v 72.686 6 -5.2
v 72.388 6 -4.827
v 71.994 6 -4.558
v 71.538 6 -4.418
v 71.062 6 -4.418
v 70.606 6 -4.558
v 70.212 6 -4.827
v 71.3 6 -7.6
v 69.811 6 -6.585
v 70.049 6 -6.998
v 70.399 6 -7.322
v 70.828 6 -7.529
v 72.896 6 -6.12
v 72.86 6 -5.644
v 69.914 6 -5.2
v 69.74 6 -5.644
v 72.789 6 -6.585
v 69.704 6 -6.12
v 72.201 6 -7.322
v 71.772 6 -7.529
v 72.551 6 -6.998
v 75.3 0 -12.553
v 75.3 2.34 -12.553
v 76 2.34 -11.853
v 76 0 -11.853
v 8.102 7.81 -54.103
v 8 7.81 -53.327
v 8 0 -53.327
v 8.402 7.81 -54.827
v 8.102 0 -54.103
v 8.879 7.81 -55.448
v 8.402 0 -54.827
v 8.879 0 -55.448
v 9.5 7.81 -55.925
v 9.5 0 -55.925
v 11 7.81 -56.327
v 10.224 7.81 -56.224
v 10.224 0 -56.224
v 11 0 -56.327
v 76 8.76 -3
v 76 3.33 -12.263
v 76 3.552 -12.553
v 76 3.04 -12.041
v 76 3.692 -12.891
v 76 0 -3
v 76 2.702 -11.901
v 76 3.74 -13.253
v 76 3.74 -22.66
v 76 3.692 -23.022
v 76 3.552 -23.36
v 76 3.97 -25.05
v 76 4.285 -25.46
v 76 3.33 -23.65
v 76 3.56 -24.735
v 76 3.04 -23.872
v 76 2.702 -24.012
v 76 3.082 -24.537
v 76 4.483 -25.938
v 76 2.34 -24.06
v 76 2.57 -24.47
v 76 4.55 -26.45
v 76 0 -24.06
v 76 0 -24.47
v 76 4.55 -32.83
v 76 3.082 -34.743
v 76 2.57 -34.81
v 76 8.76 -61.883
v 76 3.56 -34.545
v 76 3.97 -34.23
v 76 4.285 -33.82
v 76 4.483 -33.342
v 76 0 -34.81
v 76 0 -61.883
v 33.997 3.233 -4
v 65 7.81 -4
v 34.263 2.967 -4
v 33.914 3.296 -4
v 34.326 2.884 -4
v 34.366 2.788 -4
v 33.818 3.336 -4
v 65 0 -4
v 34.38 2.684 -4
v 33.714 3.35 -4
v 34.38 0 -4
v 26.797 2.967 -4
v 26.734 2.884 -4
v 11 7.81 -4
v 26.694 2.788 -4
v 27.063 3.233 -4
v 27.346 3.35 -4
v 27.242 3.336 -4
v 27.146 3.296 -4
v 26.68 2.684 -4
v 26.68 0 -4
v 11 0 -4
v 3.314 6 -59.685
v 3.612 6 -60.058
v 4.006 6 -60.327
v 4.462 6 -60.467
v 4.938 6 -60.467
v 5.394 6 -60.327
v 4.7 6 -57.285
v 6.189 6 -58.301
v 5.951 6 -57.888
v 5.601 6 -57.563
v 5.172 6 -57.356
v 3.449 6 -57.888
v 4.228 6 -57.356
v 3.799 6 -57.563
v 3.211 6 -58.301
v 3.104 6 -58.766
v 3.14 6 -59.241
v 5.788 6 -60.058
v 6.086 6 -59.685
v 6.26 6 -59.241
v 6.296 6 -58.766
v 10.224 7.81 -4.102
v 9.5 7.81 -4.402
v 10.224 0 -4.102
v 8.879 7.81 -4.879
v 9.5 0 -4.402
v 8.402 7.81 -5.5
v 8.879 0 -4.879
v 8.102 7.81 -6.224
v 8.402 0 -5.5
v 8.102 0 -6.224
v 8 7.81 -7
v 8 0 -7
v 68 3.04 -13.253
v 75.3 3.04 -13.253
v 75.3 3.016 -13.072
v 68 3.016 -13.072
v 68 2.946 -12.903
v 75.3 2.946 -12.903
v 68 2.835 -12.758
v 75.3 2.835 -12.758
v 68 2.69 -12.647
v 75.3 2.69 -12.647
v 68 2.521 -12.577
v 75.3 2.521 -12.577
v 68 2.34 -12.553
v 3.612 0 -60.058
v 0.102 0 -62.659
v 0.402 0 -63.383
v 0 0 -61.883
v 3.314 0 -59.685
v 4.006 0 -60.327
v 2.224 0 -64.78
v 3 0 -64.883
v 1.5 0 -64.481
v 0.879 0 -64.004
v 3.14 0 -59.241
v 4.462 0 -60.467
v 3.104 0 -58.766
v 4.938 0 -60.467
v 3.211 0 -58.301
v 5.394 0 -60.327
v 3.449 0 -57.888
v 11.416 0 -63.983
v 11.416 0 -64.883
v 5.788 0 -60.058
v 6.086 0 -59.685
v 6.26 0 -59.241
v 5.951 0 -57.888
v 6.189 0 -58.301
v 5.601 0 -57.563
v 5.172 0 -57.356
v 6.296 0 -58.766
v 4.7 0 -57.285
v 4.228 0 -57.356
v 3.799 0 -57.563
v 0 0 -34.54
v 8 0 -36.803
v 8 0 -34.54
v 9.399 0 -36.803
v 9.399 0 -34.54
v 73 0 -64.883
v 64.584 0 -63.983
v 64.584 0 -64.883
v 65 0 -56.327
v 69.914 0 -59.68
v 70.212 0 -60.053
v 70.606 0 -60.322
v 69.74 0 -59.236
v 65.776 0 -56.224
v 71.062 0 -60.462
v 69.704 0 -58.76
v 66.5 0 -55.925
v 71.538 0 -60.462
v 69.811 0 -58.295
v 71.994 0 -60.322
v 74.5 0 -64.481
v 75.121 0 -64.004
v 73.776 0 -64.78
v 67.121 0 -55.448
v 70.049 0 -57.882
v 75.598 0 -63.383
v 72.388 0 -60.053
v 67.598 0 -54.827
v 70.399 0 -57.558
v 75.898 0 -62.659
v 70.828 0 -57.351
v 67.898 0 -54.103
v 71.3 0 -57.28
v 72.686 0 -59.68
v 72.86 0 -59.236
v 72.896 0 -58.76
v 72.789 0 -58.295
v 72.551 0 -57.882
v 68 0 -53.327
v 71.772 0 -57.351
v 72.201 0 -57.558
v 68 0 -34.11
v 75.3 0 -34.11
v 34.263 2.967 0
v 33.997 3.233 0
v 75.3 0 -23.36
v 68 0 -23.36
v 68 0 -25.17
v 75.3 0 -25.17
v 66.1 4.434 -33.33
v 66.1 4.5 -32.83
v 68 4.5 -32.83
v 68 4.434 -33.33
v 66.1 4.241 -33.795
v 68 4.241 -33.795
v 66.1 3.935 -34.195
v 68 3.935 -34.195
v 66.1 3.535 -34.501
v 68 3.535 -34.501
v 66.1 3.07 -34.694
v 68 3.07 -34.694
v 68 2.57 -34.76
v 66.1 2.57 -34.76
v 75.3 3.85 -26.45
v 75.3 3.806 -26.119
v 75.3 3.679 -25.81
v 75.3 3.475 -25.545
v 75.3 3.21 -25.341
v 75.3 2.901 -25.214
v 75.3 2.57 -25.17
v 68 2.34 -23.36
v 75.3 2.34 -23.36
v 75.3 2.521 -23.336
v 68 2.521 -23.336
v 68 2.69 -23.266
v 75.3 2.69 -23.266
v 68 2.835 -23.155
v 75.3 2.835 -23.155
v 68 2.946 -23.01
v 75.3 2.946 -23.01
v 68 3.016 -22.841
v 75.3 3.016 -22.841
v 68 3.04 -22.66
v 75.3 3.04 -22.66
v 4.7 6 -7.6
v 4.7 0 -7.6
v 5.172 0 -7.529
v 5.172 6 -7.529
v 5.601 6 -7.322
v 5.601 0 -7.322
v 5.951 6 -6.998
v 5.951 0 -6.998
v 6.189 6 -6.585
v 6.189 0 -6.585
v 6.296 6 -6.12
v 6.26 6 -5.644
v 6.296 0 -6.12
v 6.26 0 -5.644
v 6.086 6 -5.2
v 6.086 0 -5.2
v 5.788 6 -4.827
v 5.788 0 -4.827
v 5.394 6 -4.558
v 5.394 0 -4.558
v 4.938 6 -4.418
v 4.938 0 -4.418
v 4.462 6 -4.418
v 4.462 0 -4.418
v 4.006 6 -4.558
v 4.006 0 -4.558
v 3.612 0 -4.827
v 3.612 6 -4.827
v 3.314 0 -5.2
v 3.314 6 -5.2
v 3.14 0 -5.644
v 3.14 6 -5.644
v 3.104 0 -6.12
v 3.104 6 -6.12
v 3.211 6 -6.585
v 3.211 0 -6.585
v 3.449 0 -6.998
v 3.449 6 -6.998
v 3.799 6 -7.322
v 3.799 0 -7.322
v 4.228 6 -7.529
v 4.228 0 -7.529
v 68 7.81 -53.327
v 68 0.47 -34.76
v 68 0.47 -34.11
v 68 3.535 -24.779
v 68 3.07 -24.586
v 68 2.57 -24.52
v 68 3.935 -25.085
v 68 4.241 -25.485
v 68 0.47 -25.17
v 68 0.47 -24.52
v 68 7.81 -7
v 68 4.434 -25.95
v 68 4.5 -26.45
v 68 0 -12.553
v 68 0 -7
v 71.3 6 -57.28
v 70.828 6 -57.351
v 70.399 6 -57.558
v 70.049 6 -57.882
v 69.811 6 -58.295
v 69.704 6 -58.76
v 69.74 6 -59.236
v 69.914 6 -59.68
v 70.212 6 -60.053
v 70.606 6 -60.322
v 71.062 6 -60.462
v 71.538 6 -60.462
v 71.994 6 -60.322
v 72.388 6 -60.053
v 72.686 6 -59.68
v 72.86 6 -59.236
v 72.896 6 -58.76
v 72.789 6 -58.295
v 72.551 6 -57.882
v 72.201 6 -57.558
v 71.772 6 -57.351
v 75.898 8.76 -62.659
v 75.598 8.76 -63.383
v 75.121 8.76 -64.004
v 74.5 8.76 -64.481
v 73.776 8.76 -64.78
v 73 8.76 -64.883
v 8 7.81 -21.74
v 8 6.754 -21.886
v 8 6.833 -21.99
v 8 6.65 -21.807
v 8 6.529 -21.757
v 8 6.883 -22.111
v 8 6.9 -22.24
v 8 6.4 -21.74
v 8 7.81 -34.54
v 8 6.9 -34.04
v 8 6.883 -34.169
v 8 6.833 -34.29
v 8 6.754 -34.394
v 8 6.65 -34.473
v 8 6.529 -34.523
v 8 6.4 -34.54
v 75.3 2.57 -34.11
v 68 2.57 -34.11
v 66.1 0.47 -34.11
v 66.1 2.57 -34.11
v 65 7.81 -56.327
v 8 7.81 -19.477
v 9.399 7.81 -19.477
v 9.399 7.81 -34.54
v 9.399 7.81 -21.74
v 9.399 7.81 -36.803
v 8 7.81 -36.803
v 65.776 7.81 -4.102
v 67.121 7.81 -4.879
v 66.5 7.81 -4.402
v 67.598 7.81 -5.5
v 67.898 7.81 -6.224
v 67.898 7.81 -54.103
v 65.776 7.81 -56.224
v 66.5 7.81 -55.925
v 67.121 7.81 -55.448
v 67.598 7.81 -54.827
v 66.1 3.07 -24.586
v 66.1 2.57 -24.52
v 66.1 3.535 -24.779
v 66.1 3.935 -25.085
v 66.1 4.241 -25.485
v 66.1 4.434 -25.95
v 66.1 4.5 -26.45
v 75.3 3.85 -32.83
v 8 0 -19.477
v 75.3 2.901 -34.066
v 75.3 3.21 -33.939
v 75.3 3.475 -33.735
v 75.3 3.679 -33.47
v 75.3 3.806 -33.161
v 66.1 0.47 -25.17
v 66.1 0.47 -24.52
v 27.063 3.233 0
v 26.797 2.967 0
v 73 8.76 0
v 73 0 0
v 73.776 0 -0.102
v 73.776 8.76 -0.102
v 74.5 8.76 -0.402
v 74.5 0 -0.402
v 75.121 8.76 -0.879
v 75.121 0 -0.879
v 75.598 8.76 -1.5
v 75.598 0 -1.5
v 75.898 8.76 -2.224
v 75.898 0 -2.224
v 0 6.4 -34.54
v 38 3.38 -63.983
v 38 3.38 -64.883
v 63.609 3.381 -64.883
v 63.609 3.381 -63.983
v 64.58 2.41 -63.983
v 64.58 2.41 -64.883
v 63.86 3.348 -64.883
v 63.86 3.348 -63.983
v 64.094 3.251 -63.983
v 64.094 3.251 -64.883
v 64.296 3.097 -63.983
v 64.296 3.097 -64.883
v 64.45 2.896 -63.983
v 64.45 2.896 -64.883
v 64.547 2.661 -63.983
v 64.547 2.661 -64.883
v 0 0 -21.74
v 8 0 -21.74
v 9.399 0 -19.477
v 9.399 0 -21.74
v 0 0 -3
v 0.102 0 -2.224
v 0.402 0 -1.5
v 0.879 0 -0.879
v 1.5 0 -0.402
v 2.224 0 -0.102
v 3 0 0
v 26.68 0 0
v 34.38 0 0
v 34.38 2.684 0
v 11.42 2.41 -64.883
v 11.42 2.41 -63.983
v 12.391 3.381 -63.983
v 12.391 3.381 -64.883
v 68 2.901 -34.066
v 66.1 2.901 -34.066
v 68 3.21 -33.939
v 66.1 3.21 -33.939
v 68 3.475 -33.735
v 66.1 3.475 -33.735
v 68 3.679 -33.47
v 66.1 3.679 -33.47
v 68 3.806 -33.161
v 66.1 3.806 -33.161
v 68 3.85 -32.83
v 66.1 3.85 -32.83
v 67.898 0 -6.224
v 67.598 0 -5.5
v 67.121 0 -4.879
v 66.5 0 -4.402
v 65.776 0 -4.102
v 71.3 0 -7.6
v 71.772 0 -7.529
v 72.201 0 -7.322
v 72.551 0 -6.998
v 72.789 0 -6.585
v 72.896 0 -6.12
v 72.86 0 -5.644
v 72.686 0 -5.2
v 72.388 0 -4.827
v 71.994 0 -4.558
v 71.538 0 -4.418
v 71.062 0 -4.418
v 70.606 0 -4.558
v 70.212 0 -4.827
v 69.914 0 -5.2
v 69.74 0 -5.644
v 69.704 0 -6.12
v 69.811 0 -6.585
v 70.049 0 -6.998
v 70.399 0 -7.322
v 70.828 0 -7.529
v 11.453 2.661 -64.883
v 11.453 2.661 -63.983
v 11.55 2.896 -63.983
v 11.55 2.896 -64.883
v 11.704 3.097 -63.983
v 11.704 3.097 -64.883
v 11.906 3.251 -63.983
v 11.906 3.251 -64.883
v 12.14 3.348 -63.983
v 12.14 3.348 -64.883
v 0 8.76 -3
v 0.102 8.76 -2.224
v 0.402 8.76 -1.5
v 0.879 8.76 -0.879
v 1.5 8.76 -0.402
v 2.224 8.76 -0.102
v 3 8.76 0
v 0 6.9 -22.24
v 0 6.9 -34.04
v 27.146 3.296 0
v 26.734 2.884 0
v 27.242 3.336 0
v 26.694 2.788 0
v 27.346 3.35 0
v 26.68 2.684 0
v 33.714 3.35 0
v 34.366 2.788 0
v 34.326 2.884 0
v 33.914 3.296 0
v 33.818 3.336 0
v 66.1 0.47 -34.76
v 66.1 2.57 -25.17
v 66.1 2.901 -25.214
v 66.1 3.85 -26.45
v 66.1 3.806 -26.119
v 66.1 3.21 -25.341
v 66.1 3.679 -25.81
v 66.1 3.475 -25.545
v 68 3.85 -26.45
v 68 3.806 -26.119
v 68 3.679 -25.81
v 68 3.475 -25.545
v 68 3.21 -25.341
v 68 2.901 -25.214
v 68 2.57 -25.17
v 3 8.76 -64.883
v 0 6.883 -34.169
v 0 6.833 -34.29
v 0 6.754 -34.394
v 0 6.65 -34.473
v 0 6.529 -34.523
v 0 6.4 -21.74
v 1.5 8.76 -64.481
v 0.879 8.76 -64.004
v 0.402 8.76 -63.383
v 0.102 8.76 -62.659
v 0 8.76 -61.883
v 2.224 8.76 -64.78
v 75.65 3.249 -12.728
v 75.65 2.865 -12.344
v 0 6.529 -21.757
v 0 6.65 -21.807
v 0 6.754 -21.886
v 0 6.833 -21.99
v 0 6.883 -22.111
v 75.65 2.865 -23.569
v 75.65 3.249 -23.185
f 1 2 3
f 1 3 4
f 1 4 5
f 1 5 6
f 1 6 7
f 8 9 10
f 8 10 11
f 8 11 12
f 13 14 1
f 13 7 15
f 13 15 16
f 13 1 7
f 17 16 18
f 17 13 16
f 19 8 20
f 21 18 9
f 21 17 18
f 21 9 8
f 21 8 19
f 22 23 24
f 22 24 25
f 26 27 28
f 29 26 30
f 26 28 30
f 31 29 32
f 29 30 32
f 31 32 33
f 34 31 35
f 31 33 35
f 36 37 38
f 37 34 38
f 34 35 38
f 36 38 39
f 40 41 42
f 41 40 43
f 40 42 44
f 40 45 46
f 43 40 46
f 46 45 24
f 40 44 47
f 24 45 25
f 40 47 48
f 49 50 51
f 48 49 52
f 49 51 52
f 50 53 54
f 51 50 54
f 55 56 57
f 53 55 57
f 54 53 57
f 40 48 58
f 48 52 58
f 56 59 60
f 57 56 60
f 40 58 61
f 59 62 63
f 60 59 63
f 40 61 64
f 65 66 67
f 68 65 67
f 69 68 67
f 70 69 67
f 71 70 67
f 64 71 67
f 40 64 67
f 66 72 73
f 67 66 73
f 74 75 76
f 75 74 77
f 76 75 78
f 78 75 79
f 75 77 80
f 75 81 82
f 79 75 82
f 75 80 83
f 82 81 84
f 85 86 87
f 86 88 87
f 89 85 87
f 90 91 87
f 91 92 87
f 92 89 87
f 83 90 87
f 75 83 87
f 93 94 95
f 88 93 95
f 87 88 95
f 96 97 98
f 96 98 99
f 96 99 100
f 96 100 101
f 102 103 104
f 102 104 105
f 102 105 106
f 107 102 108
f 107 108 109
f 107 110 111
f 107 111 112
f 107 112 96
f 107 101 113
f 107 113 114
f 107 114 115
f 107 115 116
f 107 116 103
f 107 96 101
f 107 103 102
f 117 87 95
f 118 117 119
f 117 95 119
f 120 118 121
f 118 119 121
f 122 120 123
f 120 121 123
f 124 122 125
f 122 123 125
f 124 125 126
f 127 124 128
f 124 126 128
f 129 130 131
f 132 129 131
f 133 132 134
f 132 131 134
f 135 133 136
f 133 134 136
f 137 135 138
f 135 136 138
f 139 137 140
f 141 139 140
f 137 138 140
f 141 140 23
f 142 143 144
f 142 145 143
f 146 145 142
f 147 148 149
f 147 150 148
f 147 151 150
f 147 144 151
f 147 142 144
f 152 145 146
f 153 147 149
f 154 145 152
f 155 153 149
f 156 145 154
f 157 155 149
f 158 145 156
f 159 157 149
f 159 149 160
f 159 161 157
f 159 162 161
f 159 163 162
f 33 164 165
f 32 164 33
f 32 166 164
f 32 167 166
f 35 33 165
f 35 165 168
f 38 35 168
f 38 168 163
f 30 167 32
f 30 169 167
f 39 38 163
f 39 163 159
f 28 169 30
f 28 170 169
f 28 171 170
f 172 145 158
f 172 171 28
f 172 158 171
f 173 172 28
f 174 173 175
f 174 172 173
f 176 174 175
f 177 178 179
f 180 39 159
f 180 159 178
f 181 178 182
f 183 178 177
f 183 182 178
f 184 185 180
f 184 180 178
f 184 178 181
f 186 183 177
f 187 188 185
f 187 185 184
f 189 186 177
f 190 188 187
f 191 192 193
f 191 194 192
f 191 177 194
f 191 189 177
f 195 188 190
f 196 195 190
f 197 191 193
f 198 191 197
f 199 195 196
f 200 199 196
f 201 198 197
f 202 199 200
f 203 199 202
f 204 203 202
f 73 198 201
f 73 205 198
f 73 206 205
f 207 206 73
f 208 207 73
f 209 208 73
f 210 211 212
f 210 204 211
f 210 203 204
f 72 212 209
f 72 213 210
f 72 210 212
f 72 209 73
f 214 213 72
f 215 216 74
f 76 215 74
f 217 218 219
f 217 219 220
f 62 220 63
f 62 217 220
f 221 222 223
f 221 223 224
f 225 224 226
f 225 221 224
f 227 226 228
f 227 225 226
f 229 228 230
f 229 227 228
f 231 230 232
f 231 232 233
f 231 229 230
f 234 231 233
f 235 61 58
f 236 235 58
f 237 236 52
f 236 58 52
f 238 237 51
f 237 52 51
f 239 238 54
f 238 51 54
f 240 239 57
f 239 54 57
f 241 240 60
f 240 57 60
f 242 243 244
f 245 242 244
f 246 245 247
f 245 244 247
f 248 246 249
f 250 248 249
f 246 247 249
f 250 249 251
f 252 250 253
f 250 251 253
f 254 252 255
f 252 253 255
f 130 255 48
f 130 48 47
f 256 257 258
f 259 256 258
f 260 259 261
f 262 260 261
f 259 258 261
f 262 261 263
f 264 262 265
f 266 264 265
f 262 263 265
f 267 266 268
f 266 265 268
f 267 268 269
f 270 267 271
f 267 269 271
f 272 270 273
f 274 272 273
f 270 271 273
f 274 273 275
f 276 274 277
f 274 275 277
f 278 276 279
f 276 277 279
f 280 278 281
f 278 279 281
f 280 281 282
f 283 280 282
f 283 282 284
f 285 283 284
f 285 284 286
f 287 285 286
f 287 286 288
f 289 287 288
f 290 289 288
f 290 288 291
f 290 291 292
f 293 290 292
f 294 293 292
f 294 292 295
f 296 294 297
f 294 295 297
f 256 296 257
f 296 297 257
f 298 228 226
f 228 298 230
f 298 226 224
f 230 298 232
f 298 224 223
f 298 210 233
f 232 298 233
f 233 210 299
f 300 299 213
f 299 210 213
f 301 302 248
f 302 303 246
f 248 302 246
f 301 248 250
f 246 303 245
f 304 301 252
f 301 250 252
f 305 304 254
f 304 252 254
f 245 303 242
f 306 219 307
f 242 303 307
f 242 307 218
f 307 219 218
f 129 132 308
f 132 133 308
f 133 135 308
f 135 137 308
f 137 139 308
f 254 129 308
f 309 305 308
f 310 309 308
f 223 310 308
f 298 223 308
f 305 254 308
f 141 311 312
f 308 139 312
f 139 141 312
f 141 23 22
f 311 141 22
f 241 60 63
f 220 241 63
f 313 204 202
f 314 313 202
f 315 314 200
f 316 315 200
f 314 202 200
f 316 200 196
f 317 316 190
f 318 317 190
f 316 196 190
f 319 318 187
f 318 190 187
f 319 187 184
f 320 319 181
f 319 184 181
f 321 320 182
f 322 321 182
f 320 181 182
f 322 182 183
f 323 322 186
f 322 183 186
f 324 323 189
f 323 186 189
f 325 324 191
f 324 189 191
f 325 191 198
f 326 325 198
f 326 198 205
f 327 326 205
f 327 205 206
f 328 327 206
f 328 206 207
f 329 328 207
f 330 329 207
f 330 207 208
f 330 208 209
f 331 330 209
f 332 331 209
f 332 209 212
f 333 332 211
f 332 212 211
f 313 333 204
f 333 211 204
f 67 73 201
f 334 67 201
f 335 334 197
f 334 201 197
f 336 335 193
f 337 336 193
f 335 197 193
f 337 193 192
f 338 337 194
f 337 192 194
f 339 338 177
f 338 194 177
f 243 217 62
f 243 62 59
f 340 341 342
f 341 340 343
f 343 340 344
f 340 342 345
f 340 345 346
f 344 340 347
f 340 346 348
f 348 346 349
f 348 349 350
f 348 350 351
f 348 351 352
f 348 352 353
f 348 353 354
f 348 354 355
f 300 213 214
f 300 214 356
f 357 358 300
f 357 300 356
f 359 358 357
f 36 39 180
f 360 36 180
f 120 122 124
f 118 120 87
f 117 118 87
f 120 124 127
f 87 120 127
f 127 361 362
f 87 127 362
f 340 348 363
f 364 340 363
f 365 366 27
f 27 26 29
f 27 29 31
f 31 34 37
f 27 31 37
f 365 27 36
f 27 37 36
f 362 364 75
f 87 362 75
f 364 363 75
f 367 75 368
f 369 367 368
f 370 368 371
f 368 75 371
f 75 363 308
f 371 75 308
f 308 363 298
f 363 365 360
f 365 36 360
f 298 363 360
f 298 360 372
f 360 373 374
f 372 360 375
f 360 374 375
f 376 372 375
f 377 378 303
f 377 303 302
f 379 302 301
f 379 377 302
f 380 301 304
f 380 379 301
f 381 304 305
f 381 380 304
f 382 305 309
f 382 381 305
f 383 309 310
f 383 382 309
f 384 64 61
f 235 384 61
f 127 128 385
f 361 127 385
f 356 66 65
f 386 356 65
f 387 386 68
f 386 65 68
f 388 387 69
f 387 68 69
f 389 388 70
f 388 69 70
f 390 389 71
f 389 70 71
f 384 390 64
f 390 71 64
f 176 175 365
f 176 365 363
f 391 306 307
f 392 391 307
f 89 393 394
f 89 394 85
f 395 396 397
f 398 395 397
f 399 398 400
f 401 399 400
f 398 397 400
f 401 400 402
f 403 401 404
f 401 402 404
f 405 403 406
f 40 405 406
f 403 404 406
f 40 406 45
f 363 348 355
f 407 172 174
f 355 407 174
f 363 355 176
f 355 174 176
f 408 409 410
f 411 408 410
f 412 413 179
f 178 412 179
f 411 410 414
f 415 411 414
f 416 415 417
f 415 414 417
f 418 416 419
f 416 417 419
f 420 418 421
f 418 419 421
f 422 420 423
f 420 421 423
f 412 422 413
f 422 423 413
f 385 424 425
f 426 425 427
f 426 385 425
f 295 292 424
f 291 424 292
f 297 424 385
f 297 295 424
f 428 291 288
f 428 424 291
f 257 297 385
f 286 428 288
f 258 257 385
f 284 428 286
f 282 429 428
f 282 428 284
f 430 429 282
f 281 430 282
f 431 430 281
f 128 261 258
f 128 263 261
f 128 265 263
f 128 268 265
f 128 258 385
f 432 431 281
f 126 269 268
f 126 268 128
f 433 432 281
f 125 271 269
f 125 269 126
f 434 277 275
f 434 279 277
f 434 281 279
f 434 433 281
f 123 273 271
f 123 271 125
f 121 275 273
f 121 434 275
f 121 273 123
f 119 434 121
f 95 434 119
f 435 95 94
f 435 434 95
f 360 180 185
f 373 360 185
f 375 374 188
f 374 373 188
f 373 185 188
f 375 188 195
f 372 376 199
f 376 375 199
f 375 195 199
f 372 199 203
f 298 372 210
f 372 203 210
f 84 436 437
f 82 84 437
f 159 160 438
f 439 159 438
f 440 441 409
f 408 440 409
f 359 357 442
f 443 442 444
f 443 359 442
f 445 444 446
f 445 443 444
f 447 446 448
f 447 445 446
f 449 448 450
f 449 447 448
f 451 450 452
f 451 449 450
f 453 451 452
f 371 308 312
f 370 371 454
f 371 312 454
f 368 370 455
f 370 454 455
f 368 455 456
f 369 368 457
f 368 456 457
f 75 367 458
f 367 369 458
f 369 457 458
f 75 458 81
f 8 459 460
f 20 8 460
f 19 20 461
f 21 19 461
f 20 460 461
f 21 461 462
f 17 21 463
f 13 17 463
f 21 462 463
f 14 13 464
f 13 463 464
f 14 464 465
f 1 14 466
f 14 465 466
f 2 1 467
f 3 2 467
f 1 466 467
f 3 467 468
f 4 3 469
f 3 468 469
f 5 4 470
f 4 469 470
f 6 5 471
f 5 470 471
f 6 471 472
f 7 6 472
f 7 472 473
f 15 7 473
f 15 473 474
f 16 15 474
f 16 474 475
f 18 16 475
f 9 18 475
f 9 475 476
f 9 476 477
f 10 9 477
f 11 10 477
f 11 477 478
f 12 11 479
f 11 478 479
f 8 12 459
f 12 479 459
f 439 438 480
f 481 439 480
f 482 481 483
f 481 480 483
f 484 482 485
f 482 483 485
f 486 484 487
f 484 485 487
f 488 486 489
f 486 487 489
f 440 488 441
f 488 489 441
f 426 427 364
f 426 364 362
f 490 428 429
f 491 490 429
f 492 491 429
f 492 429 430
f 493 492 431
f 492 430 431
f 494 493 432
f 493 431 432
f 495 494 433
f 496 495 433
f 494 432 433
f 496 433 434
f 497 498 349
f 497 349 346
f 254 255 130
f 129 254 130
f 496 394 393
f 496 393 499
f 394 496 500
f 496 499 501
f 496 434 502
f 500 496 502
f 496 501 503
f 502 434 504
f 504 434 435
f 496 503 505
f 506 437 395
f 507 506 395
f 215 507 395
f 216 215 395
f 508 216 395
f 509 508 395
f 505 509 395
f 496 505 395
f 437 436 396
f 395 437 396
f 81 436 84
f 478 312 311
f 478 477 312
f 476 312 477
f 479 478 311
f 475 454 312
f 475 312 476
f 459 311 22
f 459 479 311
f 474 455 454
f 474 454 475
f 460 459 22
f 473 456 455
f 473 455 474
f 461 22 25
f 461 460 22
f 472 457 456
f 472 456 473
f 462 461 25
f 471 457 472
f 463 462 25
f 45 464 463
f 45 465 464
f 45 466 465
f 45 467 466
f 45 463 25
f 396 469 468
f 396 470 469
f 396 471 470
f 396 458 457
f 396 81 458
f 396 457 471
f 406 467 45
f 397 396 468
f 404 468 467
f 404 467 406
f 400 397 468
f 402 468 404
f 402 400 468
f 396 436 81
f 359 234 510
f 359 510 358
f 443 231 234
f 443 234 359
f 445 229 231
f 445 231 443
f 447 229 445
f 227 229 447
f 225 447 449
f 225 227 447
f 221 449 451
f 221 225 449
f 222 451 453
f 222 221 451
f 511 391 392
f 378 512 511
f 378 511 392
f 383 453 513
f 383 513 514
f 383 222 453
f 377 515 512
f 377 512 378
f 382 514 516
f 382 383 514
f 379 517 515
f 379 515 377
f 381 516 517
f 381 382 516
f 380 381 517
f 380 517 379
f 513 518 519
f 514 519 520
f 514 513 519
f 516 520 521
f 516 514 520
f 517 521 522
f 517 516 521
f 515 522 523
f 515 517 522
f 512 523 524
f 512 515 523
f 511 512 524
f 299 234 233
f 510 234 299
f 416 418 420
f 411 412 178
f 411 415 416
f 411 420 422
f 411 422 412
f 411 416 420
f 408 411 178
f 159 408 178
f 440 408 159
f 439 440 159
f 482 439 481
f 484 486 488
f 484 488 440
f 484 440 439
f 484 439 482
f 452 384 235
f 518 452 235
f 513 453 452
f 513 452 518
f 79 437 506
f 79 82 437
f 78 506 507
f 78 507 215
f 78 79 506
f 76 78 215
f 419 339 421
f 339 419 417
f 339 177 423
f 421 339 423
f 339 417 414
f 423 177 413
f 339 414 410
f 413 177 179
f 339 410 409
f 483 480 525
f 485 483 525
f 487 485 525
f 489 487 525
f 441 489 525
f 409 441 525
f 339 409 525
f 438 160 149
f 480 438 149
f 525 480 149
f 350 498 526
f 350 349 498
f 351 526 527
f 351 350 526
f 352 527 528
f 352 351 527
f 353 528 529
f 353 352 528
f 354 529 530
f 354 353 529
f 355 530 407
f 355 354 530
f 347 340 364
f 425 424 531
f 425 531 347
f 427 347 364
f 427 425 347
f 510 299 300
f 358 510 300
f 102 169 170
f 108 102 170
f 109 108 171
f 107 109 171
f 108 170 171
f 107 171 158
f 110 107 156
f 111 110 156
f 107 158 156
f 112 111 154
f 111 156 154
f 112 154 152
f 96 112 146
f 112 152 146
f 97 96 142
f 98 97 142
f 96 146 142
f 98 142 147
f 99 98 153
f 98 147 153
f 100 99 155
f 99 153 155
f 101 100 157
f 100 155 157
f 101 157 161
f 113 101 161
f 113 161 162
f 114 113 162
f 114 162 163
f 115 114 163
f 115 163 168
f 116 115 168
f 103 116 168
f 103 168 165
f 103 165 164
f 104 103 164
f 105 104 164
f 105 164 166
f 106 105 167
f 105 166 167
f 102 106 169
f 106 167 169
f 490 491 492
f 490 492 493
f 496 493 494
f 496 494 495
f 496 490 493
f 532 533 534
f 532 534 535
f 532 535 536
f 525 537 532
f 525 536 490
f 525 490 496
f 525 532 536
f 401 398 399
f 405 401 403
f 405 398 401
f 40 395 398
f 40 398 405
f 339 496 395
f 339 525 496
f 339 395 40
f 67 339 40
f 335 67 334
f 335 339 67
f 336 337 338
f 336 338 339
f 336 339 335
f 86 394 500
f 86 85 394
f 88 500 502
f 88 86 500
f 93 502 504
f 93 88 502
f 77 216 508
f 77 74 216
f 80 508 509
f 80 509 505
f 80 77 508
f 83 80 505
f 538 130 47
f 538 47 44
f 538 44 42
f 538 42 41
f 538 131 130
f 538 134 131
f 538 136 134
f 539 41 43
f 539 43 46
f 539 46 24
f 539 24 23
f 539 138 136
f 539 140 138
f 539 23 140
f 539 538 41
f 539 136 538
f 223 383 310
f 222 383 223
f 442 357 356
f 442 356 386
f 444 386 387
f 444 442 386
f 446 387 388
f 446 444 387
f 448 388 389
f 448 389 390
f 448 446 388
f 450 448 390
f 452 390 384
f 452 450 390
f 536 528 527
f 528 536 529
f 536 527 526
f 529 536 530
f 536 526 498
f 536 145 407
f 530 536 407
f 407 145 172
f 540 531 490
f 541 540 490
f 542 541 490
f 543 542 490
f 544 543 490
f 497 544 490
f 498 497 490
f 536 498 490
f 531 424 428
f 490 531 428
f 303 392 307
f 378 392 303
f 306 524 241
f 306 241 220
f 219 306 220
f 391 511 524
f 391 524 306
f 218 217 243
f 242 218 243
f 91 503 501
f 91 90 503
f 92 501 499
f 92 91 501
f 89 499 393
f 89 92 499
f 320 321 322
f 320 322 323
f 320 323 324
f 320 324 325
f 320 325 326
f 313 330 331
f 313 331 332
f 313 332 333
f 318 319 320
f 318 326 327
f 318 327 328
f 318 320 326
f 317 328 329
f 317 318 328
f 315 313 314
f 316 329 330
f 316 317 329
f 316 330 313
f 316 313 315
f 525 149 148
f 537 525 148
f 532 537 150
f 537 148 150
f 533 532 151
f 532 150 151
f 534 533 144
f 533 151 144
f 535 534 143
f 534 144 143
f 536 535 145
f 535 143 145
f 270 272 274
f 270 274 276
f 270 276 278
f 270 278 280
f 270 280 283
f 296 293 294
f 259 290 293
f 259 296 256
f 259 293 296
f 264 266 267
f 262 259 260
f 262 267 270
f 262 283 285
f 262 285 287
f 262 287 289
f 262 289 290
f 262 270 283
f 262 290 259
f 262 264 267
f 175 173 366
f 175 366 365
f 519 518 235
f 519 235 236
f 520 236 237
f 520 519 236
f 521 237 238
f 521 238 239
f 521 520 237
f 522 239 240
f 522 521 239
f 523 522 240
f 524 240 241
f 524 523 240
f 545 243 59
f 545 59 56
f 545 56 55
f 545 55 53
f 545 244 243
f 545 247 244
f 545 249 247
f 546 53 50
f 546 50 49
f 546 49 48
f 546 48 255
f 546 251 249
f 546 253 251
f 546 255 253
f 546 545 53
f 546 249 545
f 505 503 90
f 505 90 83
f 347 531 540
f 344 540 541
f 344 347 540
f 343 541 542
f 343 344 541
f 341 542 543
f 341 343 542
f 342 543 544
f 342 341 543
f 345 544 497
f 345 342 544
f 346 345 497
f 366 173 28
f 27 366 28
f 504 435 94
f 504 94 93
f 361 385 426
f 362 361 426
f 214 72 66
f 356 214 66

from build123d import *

# Parameters (mm, degrees)
BOSS_EXTRUDE1_DEPTH = 8.76
BOSS_EXTRUDE2_START = -0.95
BOSS_EXTRUDE2_DEPTH = 0.95
SKETCH4_W           = 12.8
SKETCH4_H           = 6.9
CUT_EXTRUDE1_DEPTH  = 8
SKETCH5_W           = 1.3986406
SKETCH5_H           = 2.263006611
BOSS_EXTRUDE3_DEPTH = 7.81
CUT_EXTRUDE2_DEPTH  = 8
FILLET1_R           = 0.5
SKETCH8_W           = 8.94
SKETCH8_H           = 3.85
CUT_EXTRUDE6_DEPTH  = 8
FILLET2_R           = 1.28
BOSS_EXTRUDE5_START = 1.9
BOSS_EXTRUDE5_DEPTH = 1.9
CHAMFER1_SIZE       = 0.7
SKETCH14_R          = 1.6
CUT_EXTRUDE10_DEPTH = 6
SKETCH16_R          = 1.6
CUT_EXTRUDE11_DEPTH = 6
CUT_EXTRUDE12_DEPTH = 0.9
SKETCH19_W          = 7.7
SKETCH19_H          = 3.35
CUT_EXTRUDE13_DEPTH = 4
CHAMFER2_SIZE       = 0.5
FILLET3_R           = 0.4


with BuildPart() as part:
    # Sketch1 → Boss-Extrude1 (new body)
    with BuildSketch(Plane(origin=(0, 0, 0), x_dir=(1, 0, 0), z_dir=(0, 1, 0))):
        with BuildLine():
            ThreePointArc((0, 3), (0.878679656, 0.878679656), (3, 0))
            Line((3, 0), (73, 0))
            ThreePointArc((73, 0), (75.121320344, 0.878679656), (76, 3))
            Line((76, 3), (76, 55.62))
            Line((76, 55.62), (76, 57.326548644))
            Line((76, 57.326548644), (76, 61.882562509))
            ThreePointArc((76, 61.882562509), (75.121320344, 64.003882853), (73, 64.882562509))
            Line((73, 64.882562509), (3, 64.882562509))
            ThreePointArc((3, 64.882562509), (0.878679656, 64.003882853), (0, 61.882562509))
            Line((0, 61.882562509), (0, 57.326548644))
            Line((0, 57.326548644), (0, 55.62))
            Line((0, 55.62), (0, 3))
        make_face()
        with BuildLine():
            Line((65, 4), (11, 4))
            ThreePointArc((11, 4), (8.878679656, 4.878679656), (8, 7))
            Line((8, 7), (8, 53.326548644))
            ThreePointArc((8, 53.326548644), (8.878679656, 55.447868988), (11, 56.326548644))
            Line((11, 56.326548644), (65, 56.326548644))
            ThreePointArc((65, 56.326548644), (67.121320344, 55.447868988), (68, 53.326548644))
            Line((68, 53.326548644), (68, 7))
            ThreePointArc((68, 7), (67.121320344, 4.878679656), (65, 4))
        make_face(mode=Mode.SUBTRACT)
    extrude(amount=BOSS_EXTRUDE1_DEPTH)

    # Sketch2 → Boss-Extrude2 (add)
    with BuildSketch(Plane(origin=(0, 8.76, 0), x_dir=(1, 0, 0), z_dir=(0, 1, 0)).offset(BOSS_EXTRUDE2_START)):
        with BuildLine():
            Line((8, 48.62), (8, 7))
            ThreePointArc((8, 7), (8.878679656, 4.878679656), (11, 4))
            Line((11, 4), (65, 4))
            ThreePointArc((65, 4), (67.121320344, 4.878679656), (68, 7))
            Line((68, 7), (68, 48.62))
            Line((68, 48.62), (68, 53.326548644))
            ThreePointArc((68, 53.326548644), (67.121320344, 55.447868988), (65, 56.326548644))
            Line((65, 56.326548644), (11, 56.326548644))
            ThreePointArc((11, 56.326548644), (8.878679656, 55.447868988), (8, 53.326548644))
            Line((8, 53.326548644), (8, 48.62))
        make_face()
    extrude(amount=BOSS_EXTRUDE2_DEPTH)

    # Sketch4 → Cut-Extrude1 (cut)
    with BuildSketch(Plane.ZY):
        with Locations((-28.14, 3.45)):
            Rectangle(SKETCH4_W, SKETCH4_H)
    extrude(amount=-CUT_EXTRUDE1_DEPTH, mode=Mode.SUBTRACT)

    # Sketch5 → Boss-Extrude3 (add)
    with BuildSketch(Plane.XZ):
        with Locations((8.6993203, -20.608496695)):
            Rectangle(SKETCH5_W, SKETCH5_H)
        with Locations((8.6993203, -35.671503305)):
            Rectangle(SKETCH5_W, SKETCH5_H)
    extrude(amount=-BOSS_EXTRUDE3_DEPTH)

    # Sketch6 → Cut-Extrude2 (cut)
    with BuildSketch(Plane(origin=(76, 0, 0), x_dir=(0, 0, -1), z_dir=(1, 0, 0))):
        with BuildLine():
            Line((12.55338903, 2.34), (12.55338903, 0))
            Line((12.55338903, 0), (23.359580852, 0))
            Line((23.359580852, 0), (23.359580852, 2.34))
            ThreePointArc((23.359580852, 2.34), (23.154555599, 2.834974747), (22.659580852, 3.04))
            Line((22.659580852, 3.04), (13.25338903, 3.04))
            ThreePointArc((13.25338903, 3.04), (12.758414283, 2.834974747), (12.55338903, 2.34))
        make_face()
    extrude(amount=-CUT_EXTRUDE2_DEPTH, mode=Mode.SUBTRACT)

    # Fillet1
    fillet1_edges = [part.edges().sort_by_distance(p)[0] for p in [
        (4, 6.9, -34.54),
        (4, 6.9, -21.74),
    ]]
    fillet(fillet1_edges, radius=FILLET1_R)

    # Sketch8 → Cut-Extrude6 (cut)
    with BuildSketch(Plane(origin=(76, 0, 0), x_dir=(0, 0, -1), z_dir=(1, 0, 0))):
        with Locations((29.64, 1.925)):
            Rectangle(SKETCH8_W, SKETCH8_H)
    extrude(amount=-CUT_EXTRUDE6_DEPTH, mode=Mode.SUBTRACT)

    # Fillet2
    fillet2_edges = [part.edges().sort_by_distance(p)[0] for p in [
        (72, 3.85, -34.11),
        (72, 3.85, -25.17),
    ]]
    fillet(fillet2_edges, radius=FILLET2_R)

    # Sketch9 → Boss-Extrude5 (add)
    with BuildSketch(Plane.ZY.offset(-68).offset(BOSS_EXTRUDE5_START)):
        with BuildLine():
            Line((-34.11, 0.47), (-34.11, 2.57))
            ThreePointArc((-34.11, 2.57), (-33.73509668, 3.47509668), (-32.83, 3.85))
            Line((-32.83, 3.85), (-26.45, 3.85))
            ThreePointArc((-26.45, 3.85), (-25.54490332, 3.47509668), (-25.17, 2.57))
            Line((-25.17, 2.57), (-25.17, 0.47))
            Line((-25.17, 0.47), (-24.52, 0.47))
            Line((-24.52, 0.47), (-24.52, 2.57))
            ThreePointArc((-24.52, 2.57), (-25.085283912, 3.934716088), (-26.45, 4.5))
            Line((-26.45, 4.5), (-32.83, 4.5))
            ThreePointArc((-32.83, 4.5), (-34.194716088, 3.934716088), (-34.76, 2.57))
            Line((-34.76, 2.57), (-34.76, 0.47))
            Line((-34.76, 0.47), (-34.11, 0.47))
        make_face()
    extrude(amount=-BOSS_EXTRUDE5_DEPTH)

    # Chamfer1
    chamfer1_edges = [part.edges().sort_by_distance(p)[0] for p in [
        (76, 1.17, -23.359580852),
        (76, 2.834974747, -23.154555599),
        (76, 3.04, -17.956484941),
        (76, 2.834974747, -12.758414283),
        (76, 1.17, -12.55338903),
        (76, 1.285, -34.11),
        (76, 3.85, -29.64),
        (76, 1.285, -25.17),
        (76, 3.47509668, -33.73509668),
        (76, 3.47509668, -25.54490332),
    ]]
    chamfer(chamfer1_edges, length=CHAMFER1_SIZE)

    # Sketch14 → Cut-Extrude10 (cut)
    with BuildSketch(Plane(origin=(0, 0, 0), x_dir=(-1, 0, 0), z_dir=(0, -1, 0))):
        with Locations(Location((-4.7, 6, 0), (0, 0, 90))):
            Circle(SKETCH14_R)
        with Locations(Location((-4.7, 58.885125018, 0), (0, 0, 270))):
            Circle(SKETCH14_R)
    extrude(amount=-CUT_EXTRUDE10_DEPTH, mode=Mode.SUBTRACT)

    # Sketch16 → Cut-Extrude11 (cut)
    with BuildSketch(Plane(origin=(0, 0, 0), x_dir=(-1, 0, 0), z_dir=(0, -1, 0))):
        with Locations(Location((-71.3, 6, 0), (0, 0, 90))):
            Circle(SKETCH16_R)
        with Locations(Location((-71.3, 58.88, 0), (0, 0, 270))):
            Circle(SKETCH16_R)
    extrude(amount=-CUT_EXTRUDE11_DEPTH, mode=Mode.SUBTRACT)

    # Sketch18 → Cut-Extrude12 (cut)
    with BuildSketch(Plane(origin=(0, 0, -64.882562509), x_dir=(-1, 0, 0), z_dir=(0, 0, -1))):
        with BuildLine():
            Line((-64.583936573, -0.08), (-11.416063427, -0.08))
            Line((-11.416063427, -0.08), (-11.42000005, 2.410060225))
            ThreePointArc((-11.42000005, 2.410060225), (-11.704466584, 3.096728386), (-12.391153239, 3.381150275))
            Line((-12.391153239, 3.381150275), (-38.000003545, 3.38))
            Line((-38.000003545, 3.38), (-63.608843072, 3.381150275))
            ThreePointArc((-63.608843072, 3.381150275), (-64.295532112, 3.096729691), (-64.57999995, 2.410060225))
            Line((-64.57999995, 2.410060225), (-64.583936573, -0.08))
        make_face()
    extrude(amount=-CUT_EXTRUDE12_DEPTH, mode=Mode.SUBTRACT)

    # Sketch19 → Cut-Extrude13 (cut)
    with BuildSketch(Plane.XY):
        with Locations((30.53, 1.675)):
            Rectangle(SKETCH19_W, SKETCH19_H)
    extrude(amount=-CUT_EXTRUDE13_DEPTH, mode=Mode.SUBTRACT)

    # Chamfer2
    chamfer2_edges = [part.edges().sort_by_distance(p)[0] for p in [
        (34.38, 3.35, -2),
        (26.68, 3.35, -2),
    ]]
    chamfer(chamfer2_edges, length=CHAMFER2_SIZE)

    # Fillet3
    fillet3_edges = [part.edges().sort_by_distance(p)[0] for p in [
        (27.18, 3.35, -2),
        (33.88, 3.35, -2),
        (34.38, 2.85, -2),
        (26.68, 2.85, -2),
    ]]
    fillet(fillet3_edges, radius=FILLET3_R)


solid = part.part
